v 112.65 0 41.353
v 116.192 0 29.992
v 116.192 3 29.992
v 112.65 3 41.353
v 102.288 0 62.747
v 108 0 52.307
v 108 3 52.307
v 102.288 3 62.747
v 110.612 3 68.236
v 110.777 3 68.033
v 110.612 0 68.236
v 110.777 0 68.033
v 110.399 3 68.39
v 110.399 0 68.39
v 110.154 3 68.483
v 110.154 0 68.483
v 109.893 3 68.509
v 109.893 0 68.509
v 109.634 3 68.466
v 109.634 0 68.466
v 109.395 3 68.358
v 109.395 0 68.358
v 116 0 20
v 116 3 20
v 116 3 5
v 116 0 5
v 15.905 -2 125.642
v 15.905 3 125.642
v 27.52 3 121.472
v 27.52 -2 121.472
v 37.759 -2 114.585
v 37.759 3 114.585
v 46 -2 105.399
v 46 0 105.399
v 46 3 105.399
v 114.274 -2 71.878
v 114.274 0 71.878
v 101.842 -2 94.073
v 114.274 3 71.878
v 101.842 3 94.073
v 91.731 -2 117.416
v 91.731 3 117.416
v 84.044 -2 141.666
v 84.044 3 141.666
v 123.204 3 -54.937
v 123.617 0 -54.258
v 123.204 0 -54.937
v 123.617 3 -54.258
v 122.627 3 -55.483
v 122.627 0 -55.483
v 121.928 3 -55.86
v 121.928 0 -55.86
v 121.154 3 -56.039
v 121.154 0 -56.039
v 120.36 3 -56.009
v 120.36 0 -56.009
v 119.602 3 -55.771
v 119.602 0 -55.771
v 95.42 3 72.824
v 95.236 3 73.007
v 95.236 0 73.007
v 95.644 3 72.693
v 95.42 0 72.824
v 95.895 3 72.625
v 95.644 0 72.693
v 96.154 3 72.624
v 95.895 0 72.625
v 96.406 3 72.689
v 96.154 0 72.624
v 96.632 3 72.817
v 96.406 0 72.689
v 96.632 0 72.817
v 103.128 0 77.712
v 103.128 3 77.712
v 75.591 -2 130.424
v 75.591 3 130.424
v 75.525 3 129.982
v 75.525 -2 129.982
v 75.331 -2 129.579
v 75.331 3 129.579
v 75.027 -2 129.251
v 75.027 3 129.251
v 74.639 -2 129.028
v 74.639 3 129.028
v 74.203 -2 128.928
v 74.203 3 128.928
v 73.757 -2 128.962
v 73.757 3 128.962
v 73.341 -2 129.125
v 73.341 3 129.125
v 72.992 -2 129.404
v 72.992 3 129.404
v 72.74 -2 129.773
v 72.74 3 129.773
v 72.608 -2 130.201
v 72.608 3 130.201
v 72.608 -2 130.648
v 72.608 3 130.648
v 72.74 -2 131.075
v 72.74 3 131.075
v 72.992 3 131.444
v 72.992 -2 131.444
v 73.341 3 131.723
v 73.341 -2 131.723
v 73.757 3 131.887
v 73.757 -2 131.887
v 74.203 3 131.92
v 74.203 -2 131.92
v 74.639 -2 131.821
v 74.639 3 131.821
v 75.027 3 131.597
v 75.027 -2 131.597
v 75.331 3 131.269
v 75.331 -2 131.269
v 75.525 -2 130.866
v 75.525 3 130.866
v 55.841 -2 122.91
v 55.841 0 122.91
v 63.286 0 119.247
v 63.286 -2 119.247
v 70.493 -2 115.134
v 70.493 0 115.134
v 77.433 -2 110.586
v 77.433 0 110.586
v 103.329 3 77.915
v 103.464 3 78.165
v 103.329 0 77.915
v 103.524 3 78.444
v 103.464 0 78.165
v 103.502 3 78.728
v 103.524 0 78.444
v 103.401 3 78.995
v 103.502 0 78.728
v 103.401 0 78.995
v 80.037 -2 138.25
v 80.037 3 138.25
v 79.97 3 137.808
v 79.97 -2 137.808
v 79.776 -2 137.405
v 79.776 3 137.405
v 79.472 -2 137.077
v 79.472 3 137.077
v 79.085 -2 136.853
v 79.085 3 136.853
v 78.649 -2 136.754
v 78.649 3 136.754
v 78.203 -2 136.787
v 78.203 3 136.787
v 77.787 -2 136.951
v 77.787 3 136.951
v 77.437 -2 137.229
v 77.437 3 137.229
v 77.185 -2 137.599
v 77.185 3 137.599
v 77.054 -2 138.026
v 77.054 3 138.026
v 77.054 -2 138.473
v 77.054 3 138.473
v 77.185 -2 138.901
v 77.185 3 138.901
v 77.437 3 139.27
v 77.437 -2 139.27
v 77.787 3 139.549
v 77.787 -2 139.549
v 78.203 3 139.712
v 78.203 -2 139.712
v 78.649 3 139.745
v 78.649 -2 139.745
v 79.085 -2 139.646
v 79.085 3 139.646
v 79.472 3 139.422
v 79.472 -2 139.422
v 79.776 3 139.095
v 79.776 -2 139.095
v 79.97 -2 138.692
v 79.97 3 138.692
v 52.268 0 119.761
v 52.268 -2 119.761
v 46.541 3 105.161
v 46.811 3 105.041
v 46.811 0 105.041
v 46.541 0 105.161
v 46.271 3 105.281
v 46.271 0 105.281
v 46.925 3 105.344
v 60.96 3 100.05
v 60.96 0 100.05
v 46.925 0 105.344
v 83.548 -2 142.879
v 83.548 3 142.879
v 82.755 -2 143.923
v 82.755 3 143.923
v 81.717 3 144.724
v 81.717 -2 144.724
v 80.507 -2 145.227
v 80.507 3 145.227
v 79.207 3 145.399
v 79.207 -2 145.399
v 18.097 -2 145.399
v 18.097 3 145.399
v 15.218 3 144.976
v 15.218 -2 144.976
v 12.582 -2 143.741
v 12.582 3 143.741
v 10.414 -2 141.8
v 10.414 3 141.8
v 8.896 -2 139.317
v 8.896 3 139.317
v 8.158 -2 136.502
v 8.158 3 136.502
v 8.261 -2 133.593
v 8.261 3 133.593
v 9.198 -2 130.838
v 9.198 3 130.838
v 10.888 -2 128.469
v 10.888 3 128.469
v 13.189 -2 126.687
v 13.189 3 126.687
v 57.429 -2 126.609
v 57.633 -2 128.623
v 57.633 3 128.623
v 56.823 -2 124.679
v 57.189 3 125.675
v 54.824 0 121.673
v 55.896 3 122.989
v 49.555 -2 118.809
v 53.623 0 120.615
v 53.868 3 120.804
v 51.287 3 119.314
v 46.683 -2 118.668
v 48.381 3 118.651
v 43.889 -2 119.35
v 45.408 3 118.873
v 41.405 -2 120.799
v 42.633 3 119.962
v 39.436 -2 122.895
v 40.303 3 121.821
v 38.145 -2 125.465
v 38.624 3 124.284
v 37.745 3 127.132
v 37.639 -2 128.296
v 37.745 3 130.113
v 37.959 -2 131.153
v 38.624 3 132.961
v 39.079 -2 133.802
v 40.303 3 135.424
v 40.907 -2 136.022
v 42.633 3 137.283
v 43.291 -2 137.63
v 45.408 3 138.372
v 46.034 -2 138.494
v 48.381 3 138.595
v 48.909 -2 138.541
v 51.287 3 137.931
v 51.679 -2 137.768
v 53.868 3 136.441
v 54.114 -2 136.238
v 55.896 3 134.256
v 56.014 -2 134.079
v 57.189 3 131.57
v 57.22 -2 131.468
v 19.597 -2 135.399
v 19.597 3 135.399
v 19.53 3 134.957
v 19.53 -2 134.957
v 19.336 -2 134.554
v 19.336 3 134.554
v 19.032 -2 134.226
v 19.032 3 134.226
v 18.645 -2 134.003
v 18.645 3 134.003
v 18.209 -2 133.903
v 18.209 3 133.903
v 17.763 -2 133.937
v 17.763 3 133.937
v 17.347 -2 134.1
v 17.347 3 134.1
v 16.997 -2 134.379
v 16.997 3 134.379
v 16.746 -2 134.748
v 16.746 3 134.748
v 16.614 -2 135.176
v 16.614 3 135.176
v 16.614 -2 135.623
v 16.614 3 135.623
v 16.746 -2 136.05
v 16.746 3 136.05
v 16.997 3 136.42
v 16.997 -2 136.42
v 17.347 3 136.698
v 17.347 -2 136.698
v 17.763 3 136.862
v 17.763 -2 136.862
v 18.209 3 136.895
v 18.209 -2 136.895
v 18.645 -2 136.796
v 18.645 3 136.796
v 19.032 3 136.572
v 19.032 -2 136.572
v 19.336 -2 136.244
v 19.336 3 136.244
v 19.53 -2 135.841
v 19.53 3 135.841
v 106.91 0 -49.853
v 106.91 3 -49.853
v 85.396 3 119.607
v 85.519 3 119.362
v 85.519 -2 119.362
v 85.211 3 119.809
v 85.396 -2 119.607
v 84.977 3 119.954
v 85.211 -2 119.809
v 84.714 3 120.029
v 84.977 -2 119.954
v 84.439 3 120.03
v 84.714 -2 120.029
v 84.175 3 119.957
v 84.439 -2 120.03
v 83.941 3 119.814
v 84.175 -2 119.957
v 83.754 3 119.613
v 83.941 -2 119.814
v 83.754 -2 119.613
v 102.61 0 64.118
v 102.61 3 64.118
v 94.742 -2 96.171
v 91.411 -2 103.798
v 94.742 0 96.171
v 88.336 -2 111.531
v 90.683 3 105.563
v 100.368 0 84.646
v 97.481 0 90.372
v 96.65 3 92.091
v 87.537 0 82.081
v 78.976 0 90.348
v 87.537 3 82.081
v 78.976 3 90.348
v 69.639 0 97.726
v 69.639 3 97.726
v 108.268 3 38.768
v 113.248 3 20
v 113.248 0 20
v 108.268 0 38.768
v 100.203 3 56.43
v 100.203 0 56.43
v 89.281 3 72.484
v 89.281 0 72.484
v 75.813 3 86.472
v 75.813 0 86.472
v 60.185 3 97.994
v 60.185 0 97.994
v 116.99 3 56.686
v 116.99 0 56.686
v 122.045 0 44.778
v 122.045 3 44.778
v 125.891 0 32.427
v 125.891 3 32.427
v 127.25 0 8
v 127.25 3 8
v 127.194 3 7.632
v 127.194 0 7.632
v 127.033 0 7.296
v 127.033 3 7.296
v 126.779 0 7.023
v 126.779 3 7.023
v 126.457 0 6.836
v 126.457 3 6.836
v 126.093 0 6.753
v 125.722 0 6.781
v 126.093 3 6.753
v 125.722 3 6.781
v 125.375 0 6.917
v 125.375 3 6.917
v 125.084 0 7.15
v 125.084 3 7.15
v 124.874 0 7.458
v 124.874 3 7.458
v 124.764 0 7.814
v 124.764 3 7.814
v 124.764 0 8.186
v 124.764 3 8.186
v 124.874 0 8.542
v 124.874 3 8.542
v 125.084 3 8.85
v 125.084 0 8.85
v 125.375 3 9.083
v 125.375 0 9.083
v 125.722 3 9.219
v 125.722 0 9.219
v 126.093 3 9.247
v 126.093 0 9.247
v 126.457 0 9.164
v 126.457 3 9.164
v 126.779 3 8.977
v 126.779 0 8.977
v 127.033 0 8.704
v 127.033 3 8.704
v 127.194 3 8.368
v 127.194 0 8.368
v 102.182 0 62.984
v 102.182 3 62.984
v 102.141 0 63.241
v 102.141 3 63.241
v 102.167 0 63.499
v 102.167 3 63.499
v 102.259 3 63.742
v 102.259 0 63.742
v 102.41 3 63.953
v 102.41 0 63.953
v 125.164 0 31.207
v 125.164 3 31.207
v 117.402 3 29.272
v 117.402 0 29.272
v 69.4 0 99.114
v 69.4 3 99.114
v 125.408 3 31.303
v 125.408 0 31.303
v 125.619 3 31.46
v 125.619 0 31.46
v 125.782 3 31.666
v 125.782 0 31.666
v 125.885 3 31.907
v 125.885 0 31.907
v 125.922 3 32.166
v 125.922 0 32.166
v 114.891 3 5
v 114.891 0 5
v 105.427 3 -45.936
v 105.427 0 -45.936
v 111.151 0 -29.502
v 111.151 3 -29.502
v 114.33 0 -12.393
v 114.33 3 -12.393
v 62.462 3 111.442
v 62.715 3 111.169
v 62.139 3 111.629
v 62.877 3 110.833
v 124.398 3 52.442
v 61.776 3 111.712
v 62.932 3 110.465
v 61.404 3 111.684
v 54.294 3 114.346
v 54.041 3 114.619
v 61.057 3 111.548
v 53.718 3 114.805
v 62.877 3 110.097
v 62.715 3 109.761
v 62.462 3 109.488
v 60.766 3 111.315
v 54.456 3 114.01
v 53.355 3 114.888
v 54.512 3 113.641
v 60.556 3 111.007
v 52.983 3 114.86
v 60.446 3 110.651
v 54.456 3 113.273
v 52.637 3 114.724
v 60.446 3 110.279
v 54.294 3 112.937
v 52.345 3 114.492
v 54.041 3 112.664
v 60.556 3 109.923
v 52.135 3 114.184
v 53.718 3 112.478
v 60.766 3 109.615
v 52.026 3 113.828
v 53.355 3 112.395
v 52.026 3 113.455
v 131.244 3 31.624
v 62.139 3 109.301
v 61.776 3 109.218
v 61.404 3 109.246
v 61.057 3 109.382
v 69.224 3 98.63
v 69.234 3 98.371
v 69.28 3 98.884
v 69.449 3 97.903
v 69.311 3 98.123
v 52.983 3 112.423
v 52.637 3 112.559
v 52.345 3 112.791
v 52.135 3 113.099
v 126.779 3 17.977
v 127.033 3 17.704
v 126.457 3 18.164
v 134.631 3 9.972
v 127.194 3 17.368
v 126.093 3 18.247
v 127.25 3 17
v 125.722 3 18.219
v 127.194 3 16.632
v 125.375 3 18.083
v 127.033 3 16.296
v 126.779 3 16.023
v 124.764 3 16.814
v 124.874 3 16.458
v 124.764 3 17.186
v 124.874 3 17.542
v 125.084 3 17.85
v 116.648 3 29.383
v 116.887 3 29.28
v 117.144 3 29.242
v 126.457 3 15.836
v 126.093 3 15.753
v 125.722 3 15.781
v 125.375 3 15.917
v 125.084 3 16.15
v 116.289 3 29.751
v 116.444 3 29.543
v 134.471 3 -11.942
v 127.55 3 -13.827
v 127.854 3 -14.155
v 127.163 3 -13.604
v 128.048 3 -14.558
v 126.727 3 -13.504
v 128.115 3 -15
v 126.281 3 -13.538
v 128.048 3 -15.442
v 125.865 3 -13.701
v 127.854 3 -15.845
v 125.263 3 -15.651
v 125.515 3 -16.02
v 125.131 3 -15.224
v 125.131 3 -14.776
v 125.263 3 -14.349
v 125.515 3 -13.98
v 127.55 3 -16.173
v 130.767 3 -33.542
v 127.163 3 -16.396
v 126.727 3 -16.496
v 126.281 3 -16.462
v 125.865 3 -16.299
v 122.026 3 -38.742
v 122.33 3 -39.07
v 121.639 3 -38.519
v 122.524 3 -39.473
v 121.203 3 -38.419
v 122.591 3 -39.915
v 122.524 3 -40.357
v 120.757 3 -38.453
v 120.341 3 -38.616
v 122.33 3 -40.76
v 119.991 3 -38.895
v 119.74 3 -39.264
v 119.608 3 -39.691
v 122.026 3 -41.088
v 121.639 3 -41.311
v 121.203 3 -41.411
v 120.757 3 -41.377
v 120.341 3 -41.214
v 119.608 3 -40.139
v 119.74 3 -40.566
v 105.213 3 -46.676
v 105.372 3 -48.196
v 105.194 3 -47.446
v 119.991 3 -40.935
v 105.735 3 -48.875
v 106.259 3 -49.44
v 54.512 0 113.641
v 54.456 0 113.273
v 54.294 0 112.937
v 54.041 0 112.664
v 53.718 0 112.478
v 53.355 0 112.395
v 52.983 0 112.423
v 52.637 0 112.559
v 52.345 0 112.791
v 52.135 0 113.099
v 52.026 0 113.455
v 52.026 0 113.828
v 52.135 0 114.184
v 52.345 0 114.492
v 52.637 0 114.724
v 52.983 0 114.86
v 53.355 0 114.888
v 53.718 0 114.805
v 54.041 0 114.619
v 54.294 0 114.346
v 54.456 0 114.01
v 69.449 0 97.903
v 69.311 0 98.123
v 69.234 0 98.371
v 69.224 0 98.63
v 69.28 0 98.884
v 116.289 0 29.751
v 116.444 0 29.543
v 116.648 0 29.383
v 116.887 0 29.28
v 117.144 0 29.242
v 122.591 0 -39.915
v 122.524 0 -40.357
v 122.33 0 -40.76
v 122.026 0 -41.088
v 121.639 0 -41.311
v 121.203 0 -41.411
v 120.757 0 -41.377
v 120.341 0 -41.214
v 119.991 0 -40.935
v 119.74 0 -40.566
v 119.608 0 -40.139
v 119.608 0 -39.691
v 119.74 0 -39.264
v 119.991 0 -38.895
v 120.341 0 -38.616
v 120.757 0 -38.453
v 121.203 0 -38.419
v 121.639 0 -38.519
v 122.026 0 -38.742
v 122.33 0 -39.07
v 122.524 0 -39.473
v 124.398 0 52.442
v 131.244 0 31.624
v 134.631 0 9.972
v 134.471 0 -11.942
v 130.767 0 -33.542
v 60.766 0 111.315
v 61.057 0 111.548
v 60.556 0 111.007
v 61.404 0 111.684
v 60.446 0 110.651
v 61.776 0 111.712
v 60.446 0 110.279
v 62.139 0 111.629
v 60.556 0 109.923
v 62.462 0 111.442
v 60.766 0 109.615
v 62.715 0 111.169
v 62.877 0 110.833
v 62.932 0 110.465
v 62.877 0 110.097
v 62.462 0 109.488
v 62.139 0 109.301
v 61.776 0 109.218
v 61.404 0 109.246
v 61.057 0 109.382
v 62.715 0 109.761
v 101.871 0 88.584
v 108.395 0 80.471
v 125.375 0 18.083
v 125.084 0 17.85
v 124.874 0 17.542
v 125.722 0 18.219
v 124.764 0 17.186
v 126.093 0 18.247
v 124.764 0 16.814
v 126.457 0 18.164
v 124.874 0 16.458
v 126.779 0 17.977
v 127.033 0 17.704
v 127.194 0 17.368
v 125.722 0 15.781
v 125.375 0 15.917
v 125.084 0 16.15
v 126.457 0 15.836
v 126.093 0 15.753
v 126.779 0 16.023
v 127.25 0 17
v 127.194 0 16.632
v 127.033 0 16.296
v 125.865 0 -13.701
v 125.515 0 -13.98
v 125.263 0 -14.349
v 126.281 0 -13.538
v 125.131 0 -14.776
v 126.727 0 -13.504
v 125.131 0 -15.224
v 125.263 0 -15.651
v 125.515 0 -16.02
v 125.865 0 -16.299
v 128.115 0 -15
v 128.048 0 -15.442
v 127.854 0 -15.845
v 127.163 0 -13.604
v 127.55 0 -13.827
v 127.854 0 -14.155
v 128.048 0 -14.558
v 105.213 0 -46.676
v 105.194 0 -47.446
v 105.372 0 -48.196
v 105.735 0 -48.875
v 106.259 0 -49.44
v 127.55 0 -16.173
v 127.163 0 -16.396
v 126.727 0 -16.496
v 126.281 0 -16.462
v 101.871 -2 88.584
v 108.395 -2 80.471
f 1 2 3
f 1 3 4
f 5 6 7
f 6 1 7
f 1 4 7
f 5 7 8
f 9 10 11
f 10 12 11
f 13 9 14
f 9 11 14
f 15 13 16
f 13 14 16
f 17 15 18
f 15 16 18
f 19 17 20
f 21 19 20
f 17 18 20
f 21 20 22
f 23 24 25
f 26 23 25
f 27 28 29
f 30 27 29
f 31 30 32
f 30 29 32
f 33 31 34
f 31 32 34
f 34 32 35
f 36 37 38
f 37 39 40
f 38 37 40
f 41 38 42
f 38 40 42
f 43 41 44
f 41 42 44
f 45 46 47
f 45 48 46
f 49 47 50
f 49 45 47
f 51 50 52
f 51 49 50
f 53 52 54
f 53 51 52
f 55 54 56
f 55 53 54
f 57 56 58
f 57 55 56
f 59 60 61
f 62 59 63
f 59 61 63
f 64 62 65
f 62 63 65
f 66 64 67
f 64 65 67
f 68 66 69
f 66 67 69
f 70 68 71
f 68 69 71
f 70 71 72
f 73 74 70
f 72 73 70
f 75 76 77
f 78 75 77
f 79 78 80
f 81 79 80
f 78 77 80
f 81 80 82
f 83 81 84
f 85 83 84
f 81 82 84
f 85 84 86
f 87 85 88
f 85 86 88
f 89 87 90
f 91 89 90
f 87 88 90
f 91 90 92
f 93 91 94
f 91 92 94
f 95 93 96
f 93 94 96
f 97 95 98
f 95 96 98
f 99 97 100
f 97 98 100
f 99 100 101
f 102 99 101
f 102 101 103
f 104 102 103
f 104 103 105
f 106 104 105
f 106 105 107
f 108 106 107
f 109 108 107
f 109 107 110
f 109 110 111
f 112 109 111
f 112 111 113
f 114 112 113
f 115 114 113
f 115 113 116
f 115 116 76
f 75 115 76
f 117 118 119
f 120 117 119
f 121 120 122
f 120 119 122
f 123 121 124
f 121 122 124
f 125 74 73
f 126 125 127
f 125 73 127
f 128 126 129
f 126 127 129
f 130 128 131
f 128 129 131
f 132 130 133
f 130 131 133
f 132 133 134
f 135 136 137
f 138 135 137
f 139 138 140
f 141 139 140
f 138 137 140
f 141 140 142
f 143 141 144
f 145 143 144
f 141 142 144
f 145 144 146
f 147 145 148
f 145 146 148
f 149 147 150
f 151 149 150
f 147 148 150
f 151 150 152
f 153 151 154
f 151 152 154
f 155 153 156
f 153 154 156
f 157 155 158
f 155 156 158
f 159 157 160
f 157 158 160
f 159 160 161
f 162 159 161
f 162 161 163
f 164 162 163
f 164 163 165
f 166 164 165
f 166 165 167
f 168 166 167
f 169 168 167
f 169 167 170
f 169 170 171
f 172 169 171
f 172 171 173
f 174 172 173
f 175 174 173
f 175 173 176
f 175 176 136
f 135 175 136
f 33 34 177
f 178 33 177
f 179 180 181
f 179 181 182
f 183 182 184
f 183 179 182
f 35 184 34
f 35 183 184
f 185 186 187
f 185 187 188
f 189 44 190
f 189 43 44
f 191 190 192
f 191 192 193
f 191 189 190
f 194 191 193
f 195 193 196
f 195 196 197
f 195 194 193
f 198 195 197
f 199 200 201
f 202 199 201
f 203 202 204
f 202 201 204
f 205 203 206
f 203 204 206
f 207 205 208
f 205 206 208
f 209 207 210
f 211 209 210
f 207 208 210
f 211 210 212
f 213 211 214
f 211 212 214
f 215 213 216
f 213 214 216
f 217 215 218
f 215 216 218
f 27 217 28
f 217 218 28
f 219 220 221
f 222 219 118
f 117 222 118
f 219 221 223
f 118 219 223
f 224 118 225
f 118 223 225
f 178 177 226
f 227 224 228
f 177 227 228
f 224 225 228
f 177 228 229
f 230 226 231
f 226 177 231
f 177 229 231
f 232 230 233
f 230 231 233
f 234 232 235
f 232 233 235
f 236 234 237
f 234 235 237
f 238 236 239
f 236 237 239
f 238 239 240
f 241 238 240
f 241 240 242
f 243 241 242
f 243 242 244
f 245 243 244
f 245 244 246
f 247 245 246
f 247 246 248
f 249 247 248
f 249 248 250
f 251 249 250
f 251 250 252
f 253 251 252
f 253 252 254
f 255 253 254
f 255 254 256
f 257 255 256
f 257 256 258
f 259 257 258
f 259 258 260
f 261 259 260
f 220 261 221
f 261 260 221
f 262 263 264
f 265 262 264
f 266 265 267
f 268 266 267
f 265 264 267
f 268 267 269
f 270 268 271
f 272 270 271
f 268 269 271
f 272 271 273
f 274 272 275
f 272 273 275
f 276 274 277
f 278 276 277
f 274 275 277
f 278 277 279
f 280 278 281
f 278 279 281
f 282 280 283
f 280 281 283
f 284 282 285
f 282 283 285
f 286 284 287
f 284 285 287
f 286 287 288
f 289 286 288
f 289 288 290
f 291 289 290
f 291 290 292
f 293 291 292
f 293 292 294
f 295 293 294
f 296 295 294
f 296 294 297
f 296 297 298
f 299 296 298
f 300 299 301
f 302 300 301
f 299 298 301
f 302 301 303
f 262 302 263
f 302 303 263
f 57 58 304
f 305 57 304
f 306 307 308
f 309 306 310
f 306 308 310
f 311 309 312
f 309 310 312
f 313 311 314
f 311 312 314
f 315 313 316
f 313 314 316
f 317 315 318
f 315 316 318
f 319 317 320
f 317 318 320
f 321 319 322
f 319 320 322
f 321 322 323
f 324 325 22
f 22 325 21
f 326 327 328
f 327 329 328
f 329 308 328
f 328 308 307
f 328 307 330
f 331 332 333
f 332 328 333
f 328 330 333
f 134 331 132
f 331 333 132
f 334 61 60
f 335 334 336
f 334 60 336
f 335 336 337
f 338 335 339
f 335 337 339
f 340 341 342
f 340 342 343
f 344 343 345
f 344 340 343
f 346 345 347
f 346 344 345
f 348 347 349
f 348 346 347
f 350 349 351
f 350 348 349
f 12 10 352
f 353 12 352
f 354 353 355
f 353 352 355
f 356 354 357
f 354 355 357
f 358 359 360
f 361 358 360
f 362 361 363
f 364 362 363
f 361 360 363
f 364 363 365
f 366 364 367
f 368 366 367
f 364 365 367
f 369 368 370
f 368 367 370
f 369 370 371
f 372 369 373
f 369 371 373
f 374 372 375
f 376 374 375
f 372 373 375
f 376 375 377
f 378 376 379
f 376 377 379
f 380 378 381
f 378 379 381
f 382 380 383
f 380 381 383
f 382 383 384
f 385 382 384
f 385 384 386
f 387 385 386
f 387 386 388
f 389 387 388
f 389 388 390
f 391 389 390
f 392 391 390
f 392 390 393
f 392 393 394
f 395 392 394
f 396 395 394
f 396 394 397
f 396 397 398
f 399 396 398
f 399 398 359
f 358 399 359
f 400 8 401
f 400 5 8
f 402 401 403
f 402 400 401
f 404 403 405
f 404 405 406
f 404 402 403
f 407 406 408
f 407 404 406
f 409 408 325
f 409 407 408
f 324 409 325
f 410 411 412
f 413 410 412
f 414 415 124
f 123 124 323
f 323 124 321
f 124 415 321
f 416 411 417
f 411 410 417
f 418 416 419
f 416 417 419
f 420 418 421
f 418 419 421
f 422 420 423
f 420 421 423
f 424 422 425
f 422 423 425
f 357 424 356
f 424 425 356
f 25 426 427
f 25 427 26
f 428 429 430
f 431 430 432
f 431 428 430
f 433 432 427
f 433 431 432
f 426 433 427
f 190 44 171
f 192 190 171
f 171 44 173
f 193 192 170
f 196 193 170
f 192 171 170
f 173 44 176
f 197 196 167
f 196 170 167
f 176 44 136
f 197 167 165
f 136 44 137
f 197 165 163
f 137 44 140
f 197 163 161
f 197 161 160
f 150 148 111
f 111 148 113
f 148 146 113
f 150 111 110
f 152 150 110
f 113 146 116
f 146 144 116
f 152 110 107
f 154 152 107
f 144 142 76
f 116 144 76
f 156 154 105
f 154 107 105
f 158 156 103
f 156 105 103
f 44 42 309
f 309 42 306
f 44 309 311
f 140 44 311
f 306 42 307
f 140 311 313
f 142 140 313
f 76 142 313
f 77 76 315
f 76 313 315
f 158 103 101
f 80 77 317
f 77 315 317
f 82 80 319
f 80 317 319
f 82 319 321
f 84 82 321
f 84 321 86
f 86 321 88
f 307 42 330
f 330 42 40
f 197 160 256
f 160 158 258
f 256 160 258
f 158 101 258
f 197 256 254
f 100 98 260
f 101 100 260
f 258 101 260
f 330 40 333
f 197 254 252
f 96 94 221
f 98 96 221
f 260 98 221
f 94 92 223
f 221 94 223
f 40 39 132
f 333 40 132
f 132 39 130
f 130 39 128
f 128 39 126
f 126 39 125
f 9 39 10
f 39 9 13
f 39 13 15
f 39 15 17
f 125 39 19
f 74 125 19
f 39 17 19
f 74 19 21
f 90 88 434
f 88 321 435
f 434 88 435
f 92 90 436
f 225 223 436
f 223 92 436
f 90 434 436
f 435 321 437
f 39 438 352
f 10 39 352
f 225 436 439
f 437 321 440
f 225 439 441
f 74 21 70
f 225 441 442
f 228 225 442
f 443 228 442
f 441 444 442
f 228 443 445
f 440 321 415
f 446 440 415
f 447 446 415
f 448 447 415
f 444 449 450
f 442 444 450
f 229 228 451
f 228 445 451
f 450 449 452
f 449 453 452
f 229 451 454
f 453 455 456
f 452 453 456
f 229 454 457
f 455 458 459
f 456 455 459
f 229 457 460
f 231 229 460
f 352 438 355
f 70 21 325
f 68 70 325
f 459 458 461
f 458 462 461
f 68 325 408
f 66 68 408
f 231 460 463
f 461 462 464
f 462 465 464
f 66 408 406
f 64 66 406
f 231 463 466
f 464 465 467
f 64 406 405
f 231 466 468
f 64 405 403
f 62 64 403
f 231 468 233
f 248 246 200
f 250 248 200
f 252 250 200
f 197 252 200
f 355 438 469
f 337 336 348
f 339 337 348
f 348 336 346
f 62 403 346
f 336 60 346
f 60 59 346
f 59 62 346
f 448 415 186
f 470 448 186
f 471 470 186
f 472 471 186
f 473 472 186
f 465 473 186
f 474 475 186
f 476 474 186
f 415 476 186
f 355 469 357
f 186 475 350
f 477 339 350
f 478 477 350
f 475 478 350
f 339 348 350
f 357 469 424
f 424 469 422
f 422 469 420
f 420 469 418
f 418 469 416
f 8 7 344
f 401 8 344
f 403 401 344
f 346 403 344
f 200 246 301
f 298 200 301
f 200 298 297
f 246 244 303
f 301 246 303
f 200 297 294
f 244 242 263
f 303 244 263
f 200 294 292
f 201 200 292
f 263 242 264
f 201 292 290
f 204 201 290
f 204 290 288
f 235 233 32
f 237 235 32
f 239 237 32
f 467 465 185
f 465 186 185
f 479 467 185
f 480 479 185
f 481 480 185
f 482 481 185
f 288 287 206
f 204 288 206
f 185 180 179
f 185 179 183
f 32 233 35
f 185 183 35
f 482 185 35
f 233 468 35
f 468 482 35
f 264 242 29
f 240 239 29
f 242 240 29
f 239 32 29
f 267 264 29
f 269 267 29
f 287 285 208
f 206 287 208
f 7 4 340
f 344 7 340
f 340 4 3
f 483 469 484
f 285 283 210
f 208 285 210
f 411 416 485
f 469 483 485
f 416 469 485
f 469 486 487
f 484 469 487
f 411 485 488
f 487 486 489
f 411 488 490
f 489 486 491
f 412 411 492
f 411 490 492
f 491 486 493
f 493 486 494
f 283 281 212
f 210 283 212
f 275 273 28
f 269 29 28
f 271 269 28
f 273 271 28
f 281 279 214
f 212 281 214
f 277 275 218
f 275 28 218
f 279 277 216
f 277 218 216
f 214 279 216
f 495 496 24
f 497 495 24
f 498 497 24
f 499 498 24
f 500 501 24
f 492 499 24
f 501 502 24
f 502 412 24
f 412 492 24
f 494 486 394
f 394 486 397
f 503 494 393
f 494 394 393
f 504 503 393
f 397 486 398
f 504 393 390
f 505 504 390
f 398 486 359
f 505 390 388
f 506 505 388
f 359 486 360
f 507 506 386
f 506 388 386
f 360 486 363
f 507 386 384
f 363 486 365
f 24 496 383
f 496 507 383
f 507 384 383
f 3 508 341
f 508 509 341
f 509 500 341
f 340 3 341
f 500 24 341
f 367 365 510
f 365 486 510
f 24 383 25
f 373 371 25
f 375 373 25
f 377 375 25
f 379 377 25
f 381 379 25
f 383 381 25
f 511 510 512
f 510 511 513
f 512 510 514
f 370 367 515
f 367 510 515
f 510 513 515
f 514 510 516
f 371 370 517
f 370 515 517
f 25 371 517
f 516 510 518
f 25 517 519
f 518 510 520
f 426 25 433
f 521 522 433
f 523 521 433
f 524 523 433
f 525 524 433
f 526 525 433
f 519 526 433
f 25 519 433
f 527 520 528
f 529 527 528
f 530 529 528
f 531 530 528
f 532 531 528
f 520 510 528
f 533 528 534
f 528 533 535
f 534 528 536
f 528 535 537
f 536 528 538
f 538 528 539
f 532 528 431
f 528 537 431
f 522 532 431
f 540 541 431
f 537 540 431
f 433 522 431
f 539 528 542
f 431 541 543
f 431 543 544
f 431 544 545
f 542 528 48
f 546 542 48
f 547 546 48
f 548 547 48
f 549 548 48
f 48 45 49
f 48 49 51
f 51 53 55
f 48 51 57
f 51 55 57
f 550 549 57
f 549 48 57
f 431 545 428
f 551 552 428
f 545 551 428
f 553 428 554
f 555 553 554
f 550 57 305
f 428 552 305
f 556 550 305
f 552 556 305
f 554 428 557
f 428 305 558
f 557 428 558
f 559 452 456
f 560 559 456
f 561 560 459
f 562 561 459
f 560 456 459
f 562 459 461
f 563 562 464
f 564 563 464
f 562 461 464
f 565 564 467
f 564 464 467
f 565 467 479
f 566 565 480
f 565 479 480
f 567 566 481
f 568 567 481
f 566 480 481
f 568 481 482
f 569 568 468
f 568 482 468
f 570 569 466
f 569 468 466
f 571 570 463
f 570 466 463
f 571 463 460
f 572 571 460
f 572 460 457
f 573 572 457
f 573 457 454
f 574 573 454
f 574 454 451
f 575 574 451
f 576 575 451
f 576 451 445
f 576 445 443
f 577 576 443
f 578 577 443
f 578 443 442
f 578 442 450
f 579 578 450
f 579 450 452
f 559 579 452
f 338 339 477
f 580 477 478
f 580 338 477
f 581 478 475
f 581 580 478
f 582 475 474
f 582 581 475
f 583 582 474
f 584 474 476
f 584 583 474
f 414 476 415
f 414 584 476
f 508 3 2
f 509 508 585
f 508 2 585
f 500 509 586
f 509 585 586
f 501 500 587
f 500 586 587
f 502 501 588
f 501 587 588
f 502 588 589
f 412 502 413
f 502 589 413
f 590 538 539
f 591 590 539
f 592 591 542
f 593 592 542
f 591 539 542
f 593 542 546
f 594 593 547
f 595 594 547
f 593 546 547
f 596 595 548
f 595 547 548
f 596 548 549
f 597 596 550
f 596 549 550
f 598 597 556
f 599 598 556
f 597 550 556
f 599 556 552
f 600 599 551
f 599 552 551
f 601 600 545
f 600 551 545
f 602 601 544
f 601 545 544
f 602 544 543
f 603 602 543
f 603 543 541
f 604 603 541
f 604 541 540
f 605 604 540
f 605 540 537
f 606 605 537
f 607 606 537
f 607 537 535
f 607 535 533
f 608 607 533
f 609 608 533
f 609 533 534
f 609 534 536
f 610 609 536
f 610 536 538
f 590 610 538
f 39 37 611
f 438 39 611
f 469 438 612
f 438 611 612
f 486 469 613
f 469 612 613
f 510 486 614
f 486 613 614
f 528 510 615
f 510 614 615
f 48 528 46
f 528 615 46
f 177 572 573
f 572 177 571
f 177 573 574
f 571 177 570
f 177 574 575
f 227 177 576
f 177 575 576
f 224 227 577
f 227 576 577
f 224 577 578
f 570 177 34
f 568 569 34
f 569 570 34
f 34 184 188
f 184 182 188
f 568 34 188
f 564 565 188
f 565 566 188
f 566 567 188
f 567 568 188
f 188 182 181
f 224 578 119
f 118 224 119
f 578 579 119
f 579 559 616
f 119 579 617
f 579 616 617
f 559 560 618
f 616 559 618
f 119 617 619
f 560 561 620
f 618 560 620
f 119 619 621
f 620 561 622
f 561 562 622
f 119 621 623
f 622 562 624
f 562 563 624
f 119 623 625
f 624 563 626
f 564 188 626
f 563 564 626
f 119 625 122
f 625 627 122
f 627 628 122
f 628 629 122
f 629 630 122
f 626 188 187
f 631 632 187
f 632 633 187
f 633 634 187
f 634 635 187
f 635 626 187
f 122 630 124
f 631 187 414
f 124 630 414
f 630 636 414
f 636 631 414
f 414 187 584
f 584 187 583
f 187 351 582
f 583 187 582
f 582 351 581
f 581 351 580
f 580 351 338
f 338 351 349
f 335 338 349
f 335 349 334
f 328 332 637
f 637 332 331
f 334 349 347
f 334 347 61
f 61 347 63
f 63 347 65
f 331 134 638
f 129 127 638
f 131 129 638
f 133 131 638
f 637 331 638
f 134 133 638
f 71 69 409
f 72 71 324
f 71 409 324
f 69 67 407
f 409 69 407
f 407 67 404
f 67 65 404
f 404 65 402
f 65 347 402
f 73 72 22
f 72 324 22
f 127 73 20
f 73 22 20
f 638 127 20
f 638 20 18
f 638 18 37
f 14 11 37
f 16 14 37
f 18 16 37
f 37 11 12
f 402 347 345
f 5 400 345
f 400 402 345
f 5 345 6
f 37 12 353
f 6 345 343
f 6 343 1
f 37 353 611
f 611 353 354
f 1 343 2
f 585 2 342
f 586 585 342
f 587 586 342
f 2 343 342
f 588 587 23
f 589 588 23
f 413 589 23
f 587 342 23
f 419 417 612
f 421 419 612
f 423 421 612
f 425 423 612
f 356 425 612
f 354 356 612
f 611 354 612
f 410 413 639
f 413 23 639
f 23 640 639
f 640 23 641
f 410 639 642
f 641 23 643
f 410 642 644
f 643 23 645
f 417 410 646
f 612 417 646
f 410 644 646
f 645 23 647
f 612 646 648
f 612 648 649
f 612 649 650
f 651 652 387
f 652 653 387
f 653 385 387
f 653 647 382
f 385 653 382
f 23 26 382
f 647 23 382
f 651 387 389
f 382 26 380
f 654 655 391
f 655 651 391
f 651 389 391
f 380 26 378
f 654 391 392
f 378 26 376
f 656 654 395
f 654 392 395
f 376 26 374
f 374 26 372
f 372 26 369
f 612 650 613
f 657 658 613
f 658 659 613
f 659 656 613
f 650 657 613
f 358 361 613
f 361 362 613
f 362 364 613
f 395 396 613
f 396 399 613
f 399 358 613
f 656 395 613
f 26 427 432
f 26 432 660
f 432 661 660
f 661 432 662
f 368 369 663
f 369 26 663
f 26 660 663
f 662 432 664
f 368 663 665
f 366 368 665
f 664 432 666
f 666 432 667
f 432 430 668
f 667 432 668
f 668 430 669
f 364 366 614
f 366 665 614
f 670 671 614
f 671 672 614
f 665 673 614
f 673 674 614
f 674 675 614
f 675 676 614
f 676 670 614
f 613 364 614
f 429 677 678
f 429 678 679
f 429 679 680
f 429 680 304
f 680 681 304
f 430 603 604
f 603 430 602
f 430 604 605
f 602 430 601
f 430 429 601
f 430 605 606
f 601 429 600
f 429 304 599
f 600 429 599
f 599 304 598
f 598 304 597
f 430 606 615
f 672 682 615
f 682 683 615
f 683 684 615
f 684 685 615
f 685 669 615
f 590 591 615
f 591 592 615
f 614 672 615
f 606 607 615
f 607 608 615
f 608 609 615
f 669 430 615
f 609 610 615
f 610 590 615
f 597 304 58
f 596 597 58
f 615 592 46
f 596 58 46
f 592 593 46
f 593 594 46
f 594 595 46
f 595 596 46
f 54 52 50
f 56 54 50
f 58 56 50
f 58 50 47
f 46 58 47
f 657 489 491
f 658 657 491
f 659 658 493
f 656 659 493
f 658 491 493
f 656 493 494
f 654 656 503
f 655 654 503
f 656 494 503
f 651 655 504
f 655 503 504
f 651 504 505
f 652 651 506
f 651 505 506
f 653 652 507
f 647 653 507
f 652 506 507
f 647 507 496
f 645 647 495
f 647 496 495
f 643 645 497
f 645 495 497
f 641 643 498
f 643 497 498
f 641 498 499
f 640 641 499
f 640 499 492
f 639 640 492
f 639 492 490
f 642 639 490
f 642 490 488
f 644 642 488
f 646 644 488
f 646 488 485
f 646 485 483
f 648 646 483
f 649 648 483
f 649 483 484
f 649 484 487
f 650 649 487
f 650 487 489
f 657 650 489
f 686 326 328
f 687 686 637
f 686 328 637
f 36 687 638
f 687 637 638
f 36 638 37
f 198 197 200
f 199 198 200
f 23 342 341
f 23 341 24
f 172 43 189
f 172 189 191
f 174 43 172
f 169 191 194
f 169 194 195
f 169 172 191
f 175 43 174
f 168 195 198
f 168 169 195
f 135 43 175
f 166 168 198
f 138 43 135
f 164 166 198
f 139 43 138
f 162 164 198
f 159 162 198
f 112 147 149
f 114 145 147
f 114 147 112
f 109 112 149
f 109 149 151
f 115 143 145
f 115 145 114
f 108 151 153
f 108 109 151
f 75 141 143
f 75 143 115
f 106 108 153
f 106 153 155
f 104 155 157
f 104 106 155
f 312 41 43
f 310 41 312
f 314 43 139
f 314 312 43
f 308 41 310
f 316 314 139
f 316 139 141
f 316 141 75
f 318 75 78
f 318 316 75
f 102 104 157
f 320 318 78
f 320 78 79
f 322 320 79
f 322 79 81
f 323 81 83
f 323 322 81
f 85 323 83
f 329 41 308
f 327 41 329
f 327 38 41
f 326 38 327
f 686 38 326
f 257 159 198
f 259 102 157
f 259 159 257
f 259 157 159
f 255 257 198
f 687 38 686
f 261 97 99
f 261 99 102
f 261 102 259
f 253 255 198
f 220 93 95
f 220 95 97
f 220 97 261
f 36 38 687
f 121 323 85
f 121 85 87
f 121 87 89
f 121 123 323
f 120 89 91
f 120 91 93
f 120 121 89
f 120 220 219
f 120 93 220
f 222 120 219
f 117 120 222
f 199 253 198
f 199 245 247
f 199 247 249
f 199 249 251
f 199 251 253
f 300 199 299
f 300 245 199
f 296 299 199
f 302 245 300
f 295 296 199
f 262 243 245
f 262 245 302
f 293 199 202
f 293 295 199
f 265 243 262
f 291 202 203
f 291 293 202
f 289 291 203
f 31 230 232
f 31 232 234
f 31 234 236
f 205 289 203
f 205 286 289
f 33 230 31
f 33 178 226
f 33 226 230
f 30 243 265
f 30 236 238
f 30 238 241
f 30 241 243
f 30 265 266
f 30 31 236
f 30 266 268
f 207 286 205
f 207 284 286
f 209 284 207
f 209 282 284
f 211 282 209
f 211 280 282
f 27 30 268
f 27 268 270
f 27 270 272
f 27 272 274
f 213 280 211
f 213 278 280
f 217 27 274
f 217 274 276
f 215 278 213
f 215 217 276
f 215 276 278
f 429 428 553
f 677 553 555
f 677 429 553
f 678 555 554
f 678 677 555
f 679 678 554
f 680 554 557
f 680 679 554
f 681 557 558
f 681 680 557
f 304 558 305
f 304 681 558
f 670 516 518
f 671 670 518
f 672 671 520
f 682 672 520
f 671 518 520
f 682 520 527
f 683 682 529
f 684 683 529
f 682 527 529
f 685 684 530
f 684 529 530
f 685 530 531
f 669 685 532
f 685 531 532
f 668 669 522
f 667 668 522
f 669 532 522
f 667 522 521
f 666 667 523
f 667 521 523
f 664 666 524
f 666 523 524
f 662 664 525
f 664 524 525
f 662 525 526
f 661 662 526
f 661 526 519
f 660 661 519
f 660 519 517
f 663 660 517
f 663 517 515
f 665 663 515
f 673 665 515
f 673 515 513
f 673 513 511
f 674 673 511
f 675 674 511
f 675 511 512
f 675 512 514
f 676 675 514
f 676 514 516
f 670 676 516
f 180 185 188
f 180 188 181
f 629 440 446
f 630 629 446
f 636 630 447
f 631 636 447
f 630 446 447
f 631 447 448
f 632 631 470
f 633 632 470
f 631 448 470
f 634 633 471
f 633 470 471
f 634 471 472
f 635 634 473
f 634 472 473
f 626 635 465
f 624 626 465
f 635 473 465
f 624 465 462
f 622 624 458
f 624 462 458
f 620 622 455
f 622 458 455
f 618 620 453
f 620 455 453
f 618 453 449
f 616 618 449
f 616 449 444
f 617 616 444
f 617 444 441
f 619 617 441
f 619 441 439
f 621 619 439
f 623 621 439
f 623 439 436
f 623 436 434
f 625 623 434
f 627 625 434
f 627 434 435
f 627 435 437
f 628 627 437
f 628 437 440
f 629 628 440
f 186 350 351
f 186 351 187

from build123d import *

# Parameters (mm, degrees)
EXTRUDE_1_DEPTH     = 3
CUT_EXTRUDE_1_DEPTH = 5
EXTRUDE_2_DEPTH     = 5
SKETCH_4_R          = 1.25
SKETCH_4_R_2        = 1.5
SKETCH_4_W          = 3
SKETCH_4_H          = 15
CUT_EXTRUDE_2_DEPTH = 5
FILLET_1_R          = 3
FILLET_2_R          = 5
SKETCH_5_R          = 10
SKETCH_5_R_2        = 1.5
CUT_EXTRUDE_3_DEPTH = 10
FILLET_3_R          = 1


with BuildPart() as part:
    # 草图1 → 凸台-拉伸1 (new body)
    with BuildSketch(Plane(origin=(0, 0, 0), x_dir=(1, 0, 0), z_dir=(0, 1, 0))):
        with BuildLine():
            Line((0, 0), (0, -135))
            ThreePointArc((0, -135), (113.857845185, -72.535447127), (122.35155125, 57.053465335))
            Line((122.35155125, 57.053465335), (0, 0))
        make_face()
    extrude(amount=EXTRUDE_1_DEPTH)

    # 草图2 → 切除-拉伸1 (cut)
    with BuildSketch(Plane(origin=(0, 3, 0), x_dir=(1, 0, 0), z_dir=(0, 1, 0))):
        with BuildLine():
            Line((0, 0), (104.225395509, 48.6011001))
            ThreePointArc((104.225395509, 48.6011001), (107.568320743, -40.670091868), (46, -105.399240984))
            Line((46, -105.399240984), (54, -123.729543764))
            ThreePointArc((54, -123.729543764), (27.581801898, -132.152352246), (0, -135))
            Line((0, -135), (0, 0))
        make_face()
    extrude(amount=-CUT_EXTRUDE_1_DEPTH, mode=Mode.SUBTRACT)

    # 草图3 → 凸台-拉伸2 (add)
    with BuildSketch(Plane(origin=(0, 3, 0), x_dir=(1, 0, 0), z_dir=(0, 1, 0))):
        with BuildLine():
            Line((46, -105.399240984), (54, -123.729543764))
            ThreePointArc((54, -123.729543764), (88.040639509, -102.341808636), (114.273799591, -71.878360632))
            ThreePointArc((114.273799591, -71.878360632), (95.730838943, -107.385901313), (83.09704134, -145.399240984))
            Line((83.09704134, -145.399240984), (18.09704134, -145.399240984))
            ThreePointArc((18.09704134, -145.399240984), (8.158015649, -136.501859828), (15.905249936, -125.642394647))
            ThreePointArc((15.905249936, -125.642394647), (32.852844555, -118.345804202), (46, -105.399240984))
        make_face()
    extrude(amount=-EXTRUDE_2_DEPTH)

    # 草图4 → 切除-拉伸2 (cut)
    with BuildSketch(Plane(origin=(0, 3, 0), x_dir=(1, 0, 0), z_dir=(0, 1, 0))):
        with Locations((126, -8)):
            Circle(SKETCH_4_R)
        with Locations((126, -17)):
            Circle(SKETCH_4_R)
        with Locations((18.09704134, -135.399240984)):
            Circle(SKETCH_4_R_2)
        with Locations((53.261619346, -113.641470943)):
            Circle(SKETCH_4_R)
        with Locations((61.682428963, -110.465000355)):
            Circle(SKETCH_4_R)
        with Locations((121.091047045, 39.915013787)):
            Circle(SKETCH_4_R_2)
        with Locations((126.614572621, 15)):
            Circle(SKETCH_4_R_2)
        Polygon((59.901130208, -97.242785157), (60.959953737, -100.049721696), (46.925271043, -105.343839343), (45.866447513, -102.536902804), align=None)
        with Locations((114.5, -12.5)):
            Rectangle(SKETCH_4_W, SKETCH_4_H)
    extrude(amount=-CUT_EXTRUDE_2_DEPTH, mode=Mode.SUBTRACT)

    # 圆角1
    fillet_1_edges = [part.edges().sort_by_distance(p)[0] for p in [
        (104.225395509, 1.5, -48.6011001),
        (122.35155125, 1.5, -57.053465335),
    ]]
    fillet(fillet_1_edges, radius=FILLET_1_R)

    # 圆角2
    fillet_2_edges = [part.edges().sort_by_distance(p)[0] for p in [
        (83.09704134, 0.5, 145.399240984),
    ]]
    fillet(fillet_2_edges, radius=FILLET_2_R)

    # 草图5 → 切除-拉伸3 (cut)
    with BuildSketch(Plane(origin=(0, 3, 0), x_dir=(1, 0, 0), z_dir=(0, 1, 0))):
        with Locations((47.633497714, -128.622545035)):
            Circle(SKETCH_5_R)
        with Locations((78.536756787, -138.249693791)):
            Circle(SKETCH_5_R_2)
        with Locations((74.091279988, -130.424239426)):
            Circle(SKETCH_5_R_2)
        with BuildLine():
            Line((68.829172362, -98.298245315), (84.88931258, -121.234502555))
            ThreePointArc((84.88931258, -121.234502555), (93.343637557, -99.289475714), (103.822616306, -78.23595301))
            Line((103.822616306, -78.23595301), (95.836261206, -72.217802778))
            ThreePointArc((95.836261206, -72.217802778), (83.359004455, -86.320776041), (68.829172362, -98.298245315))
        make_face()
        with BuildLine():
            Line((101.765771539, -63.590311708), (110.2462525, -68.88950435))
            ThreePointArc((110.2462525, -68.88950435), (119.665630949, -50.795046704), (126.138444416, -31.449846428))
            Line((126.138444416, -31.449846428), (116.435487153, -29.030627472))
            ThreePointArc((116.435487153, -29.030627472), (110.460582414, -46.887735419), (101.765771539, -63.590311708))
        make_face()
    extrude(amount=-CUT_EXTRUDE_3_DEPTH, mode=Mode.SUBTRACT)

    # 圆角3
    fillet_3_edges = [part.edges().sort_by_distance(p)[0] for p in [
        (101.765771539, 1.5, 63.590311708),
        (116.435487153, 1.5, 29.030627472),
        (126.138444416, 1.5, 31.449846428),
        (110.2462525, 1.5, 68.88950435),
        (68.829172362, 1.5, 98.298245315),
        (95.836261206, 1.5, 72.217802778),
        (103.822616306, 1.5, 78.23595301),
        (84.88931258, 0.5, 121.234502555),
    ]]
    fillet(fillet_3_edges, radius=FILLET_3_R)


solid = part.part
